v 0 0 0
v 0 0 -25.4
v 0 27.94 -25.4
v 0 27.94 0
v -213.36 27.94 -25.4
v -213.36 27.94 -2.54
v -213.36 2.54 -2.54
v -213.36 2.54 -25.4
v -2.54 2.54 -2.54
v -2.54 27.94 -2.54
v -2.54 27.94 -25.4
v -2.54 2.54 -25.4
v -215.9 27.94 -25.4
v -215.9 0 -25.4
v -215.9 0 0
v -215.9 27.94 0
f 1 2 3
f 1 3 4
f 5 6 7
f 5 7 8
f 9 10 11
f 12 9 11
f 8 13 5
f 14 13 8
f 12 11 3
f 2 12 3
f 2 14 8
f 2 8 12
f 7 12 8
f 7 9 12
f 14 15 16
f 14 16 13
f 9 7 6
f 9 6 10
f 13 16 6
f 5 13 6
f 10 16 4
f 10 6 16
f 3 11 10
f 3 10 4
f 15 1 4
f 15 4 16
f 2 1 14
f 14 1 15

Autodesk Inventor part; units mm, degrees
ref_plane "YZ Plane" through (0, 0, 0) normal (1, 0, 0) x (0, 1, 0)
ref_plane "XZ Plane" through (0, 0, 0) normal (0, 1, 0) x (-1, 0, 0)
ref_plane "XY Plane" through (0, 0, 0) normal (0, 0, 1) x (1, 0, 0)
sketch "Sketch1" plane through (0, 0, 0) normal (0, 1, 0) x (-1, 0, 0)
  line L0 (0, 0) -> (215.9, 0)
  line L1 (215.9, 0) -> (215.9, -25.4)
  line L2 (215.9, -25.4) -> (0, -25.4)
  line L3 (0, -25.4) -> (0, 0)
  dimension "d0" = 215.9
  dimension "d1" = 25.4
extrude "Extrusion1" add sketch "Sketch1" along normal blind 2.54
sketch "Sketch2" plane through (0, 2.54, 0) normal (0, 1, 0) x (1, 0, 0)
  line L0 (0, 0) -> (0, 25.4) projected
  line L1 (0, 25.4) -> (-215.9, 25.4) projected
  line L2 (0, 0) -> (-2.54, 0)
  line L3 (-2.54, 2.54) -> (-2.54, 25.4)
  line L4 (-2.54, 25.4) -> (0, 25.4)
  line L5 (0, 25.4) -> (0, 0)
  line L6 (-215.9, 25.4) -> (-215.9, 0) projected
  line L7 (0, 0) -> (-215.9, 0)
  line L8 (-215.9, 0) -> (-215.9, 2.54)
  line L9 (-213.36, 2.54) -> (-2.54, 2.54)
  line L10 (0, 2.54) -> (0, 0)
  line L11 (-215.9, 0) -> (0, 0) projected
  line L12 (-215.9, 0) -> (-213.36, 0)
  line L13 (-213.36, 2.54) -> (-213.36, 25.4)
  line L14 (-213.36, 25.4) -> (-215.9, 25.4)
  line L15 (-215.9, 25.4) -> (-215.9, 0)
  dimension "d4" = 2.54
  dimension "d5" = 2.54
  dimension "d6" = 2.54
extrude "Extrusion2" add sketch "Sketch2" along normal blind 25.4 contours L2 L7 L6 L1 L13 L9 L3 L0
properties part number "batterymount" material "UHMW, Black"
